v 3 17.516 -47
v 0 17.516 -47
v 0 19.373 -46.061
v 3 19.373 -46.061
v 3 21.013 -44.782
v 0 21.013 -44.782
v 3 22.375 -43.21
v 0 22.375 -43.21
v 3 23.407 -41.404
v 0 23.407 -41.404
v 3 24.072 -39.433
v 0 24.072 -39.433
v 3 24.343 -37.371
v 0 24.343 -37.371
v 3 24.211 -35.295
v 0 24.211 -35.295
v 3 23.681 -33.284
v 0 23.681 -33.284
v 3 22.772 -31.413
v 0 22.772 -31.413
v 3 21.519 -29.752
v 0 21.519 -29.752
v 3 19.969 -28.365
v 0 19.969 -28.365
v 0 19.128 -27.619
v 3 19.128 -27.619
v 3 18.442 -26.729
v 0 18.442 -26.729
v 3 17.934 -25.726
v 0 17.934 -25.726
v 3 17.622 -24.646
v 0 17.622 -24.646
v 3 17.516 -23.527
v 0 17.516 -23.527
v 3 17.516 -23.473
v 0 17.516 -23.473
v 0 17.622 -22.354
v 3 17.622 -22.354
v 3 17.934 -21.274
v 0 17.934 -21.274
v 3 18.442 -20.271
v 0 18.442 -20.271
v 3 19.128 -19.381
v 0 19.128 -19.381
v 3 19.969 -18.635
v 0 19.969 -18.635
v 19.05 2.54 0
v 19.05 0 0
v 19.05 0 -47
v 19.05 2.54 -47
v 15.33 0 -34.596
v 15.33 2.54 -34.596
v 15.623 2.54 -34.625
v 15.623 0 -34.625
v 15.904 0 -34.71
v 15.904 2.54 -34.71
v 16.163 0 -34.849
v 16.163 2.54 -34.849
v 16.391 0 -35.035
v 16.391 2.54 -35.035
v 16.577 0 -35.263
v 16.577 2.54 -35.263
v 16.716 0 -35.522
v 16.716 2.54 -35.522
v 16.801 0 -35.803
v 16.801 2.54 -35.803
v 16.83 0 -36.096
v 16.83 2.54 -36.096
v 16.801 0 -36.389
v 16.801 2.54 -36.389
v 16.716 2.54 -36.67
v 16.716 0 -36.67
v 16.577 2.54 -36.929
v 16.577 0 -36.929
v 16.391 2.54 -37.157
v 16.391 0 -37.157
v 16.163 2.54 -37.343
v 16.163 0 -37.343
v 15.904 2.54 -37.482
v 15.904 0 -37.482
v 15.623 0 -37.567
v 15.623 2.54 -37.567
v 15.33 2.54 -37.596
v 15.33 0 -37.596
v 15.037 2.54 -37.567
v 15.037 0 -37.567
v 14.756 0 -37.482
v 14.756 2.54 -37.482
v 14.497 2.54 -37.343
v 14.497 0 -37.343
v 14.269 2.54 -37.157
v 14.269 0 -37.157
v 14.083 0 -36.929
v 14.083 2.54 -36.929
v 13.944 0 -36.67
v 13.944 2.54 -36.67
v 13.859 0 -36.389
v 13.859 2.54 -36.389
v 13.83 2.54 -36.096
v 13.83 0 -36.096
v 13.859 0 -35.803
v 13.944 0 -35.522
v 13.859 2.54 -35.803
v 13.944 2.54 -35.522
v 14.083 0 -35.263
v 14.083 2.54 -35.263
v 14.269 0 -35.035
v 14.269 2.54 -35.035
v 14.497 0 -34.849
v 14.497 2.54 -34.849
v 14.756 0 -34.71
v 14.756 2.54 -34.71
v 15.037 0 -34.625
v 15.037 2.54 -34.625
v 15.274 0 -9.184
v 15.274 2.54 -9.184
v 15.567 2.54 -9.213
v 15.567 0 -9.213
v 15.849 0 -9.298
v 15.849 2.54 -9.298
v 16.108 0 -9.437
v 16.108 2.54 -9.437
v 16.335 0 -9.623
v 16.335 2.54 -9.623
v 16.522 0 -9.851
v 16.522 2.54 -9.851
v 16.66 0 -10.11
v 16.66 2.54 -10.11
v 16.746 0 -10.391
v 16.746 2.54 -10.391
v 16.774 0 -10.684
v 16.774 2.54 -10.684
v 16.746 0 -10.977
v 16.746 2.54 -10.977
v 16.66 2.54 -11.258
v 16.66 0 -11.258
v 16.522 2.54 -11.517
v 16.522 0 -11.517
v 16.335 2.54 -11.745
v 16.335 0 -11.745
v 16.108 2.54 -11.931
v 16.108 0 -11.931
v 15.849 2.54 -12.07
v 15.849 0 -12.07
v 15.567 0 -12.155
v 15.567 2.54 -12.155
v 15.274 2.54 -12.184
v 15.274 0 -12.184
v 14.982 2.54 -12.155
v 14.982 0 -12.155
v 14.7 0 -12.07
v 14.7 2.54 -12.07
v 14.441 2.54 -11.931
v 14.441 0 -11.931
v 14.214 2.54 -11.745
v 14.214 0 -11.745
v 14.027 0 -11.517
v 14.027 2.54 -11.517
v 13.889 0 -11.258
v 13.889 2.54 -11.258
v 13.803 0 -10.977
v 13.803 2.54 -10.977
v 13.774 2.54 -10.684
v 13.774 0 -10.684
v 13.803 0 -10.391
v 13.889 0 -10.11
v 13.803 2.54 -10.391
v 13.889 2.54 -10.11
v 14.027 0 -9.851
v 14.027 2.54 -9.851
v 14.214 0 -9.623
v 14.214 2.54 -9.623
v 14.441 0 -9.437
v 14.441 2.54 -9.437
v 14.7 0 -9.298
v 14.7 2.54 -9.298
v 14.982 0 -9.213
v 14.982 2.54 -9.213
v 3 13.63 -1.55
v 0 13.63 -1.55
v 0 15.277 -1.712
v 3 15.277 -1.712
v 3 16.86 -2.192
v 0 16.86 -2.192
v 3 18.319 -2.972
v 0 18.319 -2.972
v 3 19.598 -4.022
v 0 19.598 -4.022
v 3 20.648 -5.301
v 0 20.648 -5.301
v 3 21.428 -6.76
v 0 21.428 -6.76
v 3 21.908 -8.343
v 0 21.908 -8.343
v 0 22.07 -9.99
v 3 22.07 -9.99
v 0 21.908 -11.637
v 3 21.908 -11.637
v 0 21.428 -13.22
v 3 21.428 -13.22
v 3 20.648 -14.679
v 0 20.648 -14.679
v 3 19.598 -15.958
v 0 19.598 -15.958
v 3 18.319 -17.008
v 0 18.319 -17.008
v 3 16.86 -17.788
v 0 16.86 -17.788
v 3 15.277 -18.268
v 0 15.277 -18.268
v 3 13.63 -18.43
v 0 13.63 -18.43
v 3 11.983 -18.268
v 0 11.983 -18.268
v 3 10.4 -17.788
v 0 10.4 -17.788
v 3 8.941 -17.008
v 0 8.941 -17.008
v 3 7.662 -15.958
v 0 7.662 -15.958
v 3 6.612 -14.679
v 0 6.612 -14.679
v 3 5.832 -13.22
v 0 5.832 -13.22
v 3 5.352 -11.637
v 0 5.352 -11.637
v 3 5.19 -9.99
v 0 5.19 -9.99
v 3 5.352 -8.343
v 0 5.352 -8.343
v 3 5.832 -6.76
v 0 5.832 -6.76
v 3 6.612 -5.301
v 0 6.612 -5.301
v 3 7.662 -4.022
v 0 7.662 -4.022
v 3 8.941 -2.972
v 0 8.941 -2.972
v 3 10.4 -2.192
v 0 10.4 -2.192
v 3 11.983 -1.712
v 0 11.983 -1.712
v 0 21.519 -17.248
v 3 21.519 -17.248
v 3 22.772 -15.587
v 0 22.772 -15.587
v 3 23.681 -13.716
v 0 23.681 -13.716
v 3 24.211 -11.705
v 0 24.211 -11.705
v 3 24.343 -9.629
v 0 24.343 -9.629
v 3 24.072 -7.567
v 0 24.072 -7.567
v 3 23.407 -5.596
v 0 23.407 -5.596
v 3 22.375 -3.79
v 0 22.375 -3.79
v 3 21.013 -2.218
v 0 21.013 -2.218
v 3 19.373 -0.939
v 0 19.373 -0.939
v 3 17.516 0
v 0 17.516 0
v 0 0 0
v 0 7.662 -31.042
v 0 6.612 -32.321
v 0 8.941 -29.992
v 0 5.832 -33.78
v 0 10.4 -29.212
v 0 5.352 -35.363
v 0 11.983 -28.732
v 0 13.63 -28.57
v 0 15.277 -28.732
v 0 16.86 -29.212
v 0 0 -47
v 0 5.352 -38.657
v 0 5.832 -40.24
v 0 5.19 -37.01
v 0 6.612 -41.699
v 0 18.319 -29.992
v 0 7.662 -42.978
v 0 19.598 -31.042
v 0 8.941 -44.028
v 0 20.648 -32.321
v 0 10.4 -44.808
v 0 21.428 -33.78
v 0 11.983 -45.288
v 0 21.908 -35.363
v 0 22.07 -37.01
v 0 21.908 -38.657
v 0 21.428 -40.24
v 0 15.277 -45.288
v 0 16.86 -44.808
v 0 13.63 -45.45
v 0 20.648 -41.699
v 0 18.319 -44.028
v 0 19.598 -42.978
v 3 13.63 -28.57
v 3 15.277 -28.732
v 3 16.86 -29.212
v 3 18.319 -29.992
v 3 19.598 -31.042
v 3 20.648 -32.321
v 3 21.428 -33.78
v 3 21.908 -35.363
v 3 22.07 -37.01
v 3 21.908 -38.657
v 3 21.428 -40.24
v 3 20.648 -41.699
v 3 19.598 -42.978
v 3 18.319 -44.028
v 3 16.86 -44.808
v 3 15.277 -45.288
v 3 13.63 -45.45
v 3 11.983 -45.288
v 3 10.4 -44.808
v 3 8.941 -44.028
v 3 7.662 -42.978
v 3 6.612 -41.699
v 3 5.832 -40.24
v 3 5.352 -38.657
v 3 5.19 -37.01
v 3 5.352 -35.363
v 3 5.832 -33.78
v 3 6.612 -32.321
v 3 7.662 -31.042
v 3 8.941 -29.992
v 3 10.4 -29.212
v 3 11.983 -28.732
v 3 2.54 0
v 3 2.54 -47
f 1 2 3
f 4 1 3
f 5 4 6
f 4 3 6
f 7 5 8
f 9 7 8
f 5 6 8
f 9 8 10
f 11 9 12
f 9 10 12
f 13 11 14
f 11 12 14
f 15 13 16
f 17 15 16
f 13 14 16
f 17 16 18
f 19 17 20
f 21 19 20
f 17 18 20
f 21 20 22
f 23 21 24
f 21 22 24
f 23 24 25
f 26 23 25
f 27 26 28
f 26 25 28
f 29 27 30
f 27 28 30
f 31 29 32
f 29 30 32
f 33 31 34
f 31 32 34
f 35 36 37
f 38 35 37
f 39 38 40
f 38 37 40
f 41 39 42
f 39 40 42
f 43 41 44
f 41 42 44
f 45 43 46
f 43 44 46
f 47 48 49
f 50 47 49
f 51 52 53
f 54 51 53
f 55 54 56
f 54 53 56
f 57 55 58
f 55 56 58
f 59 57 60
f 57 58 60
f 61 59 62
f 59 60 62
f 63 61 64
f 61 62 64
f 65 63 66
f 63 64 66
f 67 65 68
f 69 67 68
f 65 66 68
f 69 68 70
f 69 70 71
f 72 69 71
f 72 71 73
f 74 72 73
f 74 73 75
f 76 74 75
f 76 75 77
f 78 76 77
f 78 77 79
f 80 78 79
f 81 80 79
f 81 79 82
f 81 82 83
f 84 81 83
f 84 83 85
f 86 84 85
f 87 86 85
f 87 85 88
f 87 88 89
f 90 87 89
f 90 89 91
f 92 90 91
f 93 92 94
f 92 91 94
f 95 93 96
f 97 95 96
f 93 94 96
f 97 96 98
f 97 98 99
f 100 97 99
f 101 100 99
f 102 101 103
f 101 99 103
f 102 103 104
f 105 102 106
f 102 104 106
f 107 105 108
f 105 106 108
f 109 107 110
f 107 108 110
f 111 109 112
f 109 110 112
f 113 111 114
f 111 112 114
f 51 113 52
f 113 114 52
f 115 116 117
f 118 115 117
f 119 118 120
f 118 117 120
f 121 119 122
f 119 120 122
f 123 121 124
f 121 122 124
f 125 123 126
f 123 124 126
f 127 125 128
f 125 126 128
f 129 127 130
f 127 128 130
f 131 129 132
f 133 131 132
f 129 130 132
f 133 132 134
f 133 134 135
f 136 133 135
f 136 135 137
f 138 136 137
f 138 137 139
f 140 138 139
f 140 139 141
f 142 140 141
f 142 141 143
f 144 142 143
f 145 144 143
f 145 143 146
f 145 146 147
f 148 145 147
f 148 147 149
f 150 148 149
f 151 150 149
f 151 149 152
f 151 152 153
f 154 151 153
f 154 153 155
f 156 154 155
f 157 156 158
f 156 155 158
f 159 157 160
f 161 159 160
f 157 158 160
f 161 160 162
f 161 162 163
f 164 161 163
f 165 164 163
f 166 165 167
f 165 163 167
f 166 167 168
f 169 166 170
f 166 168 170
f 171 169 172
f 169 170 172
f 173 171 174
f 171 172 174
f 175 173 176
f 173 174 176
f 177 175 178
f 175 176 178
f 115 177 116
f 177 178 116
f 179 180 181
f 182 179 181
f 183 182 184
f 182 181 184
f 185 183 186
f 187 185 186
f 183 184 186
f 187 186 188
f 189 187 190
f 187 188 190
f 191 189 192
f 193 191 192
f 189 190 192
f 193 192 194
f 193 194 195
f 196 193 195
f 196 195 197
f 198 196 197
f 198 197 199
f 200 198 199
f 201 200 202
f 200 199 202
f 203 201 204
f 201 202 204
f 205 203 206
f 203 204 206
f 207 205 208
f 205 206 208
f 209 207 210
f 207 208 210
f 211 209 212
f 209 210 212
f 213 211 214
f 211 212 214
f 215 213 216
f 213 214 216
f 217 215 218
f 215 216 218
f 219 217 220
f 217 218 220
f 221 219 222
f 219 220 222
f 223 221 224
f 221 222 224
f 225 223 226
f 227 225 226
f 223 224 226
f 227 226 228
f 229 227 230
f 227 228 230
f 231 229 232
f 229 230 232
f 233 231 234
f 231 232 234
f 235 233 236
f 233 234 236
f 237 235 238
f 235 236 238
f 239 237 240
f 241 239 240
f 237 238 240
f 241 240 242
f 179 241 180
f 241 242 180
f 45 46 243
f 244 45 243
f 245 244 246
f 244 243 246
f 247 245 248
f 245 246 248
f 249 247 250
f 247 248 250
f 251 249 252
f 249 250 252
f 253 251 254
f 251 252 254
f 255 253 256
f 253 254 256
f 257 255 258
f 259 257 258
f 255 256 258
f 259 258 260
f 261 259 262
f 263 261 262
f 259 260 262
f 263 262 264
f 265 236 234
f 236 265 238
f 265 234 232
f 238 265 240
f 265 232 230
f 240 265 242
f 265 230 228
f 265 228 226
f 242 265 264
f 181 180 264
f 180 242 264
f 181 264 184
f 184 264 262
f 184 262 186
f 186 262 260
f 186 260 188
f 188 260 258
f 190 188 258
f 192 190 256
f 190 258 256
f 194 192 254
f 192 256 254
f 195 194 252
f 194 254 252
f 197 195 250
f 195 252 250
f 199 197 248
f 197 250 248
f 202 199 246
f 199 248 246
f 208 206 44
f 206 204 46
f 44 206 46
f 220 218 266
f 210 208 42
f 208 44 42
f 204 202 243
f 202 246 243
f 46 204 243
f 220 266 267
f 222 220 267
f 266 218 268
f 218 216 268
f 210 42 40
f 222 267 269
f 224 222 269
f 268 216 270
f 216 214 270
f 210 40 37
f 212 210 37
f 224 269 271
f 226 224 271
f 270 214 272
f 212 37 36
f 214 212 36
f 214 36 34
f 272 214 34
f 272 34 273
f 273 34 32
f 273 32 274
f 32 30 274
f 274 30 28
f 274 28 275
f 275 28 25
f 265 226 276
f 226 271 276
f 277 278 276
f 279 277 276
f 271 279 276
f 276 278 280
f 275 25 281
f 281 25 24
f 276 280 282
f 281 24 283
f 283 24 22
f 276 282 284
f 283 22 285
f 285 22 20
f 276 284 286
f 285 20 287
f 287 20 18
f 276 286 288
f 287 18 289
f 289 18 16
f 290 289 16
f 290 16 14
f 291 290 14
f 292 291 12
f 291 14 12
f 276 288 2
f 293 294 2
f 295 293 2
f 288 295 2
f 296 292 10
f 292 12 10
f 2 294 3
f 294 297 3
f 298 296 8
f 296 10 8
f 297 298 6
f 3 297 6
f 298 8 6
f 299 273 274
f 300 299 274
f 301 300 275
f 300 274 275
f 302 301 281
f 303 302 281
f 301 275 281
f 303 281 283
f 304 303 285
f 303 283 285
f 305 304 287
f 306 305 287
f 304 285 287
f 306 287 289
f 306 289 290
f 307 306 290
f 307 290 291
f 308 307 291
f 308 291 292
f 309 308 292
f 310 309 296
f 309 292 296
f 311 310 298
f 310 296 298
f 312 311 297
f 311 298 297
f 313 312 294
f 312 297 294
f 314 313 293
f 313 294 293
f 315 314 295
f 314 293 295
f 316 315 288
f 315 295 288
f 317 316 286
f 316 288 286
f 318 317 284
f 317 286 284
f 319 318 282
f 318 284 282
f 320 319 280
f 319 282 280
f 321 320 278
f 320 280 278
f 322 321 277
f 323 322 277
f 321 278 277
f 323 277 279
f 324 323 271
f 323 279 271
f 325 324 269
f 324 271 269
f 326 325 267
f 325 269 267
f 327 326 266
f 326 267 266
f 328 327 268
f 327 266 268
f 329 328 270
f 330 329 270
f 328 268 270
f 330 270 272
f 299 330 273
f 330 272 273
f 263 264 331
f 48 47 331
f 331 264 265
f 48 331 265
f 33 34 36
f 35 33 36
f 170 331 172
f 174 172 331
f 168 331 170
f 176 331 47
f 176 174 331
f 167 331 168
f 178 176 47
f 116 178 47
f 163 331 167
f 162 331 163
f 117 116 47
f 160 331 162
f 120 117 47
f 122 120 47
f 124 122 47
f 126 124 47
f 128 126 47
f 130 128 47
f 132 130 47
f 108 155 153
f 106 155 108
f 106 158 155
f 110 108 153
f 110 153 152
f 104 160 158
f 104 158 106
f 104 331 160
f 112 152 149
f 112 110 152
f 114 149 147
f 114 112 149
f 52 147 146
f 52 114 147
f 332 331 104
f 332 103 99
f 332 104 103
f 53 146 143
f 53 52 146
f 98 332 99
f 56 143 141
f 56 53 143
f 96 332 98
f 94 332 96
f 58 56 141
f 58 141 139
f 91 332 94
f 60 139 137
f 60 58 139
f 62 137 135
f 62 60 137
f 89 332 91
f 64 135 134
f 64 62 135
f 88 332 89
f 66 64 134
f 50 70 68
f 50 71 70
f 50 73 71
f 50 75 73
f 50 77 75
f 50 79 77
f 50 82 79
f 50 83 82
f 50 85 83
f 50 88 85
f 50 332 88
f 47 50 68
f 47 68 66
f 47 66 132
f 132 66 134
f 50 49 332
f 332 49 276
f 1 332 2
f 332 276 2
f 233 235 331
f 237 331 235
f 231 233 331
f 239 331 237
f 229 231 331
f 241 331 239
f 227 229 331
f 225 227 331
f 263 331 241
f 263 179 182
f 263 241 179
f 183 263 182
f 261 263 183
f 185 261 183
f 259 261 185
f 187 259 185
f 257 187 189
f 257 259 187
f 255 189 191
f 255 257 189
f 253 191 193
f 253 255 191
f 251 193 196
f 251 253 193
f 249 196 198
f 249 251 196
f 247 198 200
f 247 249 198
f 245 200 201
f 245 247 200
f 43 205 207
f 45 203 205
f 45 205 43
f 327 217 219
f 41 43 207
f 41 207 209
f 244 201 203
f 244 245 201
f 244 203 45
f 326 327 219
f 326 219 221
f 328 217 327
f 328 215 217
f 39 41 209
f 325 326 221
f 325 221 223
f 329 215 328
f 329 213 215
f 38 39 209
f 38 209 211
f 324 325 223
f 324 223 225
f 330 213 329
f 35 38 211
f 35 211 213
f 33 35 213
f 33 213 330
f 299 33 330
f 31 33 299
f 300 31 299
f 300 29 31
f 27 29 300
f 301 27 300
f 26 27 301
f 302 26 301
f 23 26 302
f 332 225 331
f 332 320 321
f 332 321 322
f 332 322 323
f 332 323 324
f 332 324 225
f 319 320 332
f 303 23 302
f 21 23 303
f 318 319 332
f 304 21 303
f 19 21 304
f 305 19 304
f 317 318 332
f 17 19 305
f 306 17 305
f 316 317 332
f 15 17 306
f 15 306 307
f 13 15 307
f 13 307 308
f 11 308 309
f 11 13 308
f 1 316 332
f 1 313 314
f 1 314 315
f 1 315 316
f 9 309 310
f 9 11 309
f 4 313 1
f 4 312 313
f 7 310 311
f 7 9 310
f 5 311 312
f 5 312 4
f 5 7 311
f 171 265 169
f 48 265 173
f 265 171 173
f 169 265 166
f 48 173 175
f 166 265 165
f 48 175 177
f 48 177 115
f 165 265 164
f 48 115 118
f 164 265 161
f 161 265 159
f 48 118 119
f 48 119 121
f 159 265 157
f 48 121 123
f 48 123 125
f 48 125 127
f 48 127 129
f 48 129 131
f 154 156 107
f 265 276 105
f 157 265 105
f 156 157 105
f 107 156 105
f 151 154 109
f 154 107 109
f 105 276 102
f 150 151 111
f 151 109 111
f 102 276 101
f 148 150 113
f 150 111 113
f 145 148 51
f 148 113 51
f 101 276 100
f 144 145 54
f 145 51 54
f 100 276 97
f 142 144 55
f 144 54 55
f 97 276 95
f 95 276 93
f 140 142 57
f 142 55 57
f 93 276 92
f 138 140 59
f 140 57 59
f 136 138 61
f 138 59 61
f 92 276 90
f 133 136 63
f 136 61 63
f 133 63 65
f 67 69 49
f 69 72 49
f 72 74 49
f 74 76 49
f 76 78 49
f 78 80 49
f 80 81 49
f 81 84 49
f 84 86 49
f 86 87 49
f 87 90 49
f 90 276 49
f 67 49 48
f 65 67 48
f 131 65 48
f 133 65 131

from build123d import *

# Parameters (mm, degrees)
SKETCH1_W           = 19.05
SKETCH1_H           = 47
BOSS_EXTRUDE1_DEPTH = 2.54
SKETCH2_R           = 8.44
BOSS_EXTRUDE2_DEPTH = 3
SKETCH3_R           = 1.5
CUT_EXTRUDE1_DEPTH  = 56.204627156


with BuildPart() as part:
    # Sketch1 → Boss-Extrude1 (new body)
    with BuildSketch(Plane(origin=(0, 0, 0), x_dir=(1, 0, 0), z_dir=(0, 1, 0))):
        with Locations((9.525, 23.5)):
            Rectangle(SKETCH1_W, SKETCH1_H)
    extrude(amount=BOSS_EXTRUDE1_DEPTH)

    # Sketch2 → Boss-Extrude2 (add)
    with BuildSketch(Plane.ZY):
        with BuildLine():
            Line((-23.526869674, 17.516472082), (-23.473130326, 17.516472082))
            ThreePointArc((-23.473130326, 17.516472082), (-20.760886981, 18.164487773), (-18.634502385, 19.968560069))
            ThreePointArc((-18.634502385, 19.968560069), (-8.591509803, 24.257746253), (0, 17.516472082))
            Line((0, 17.516472082), (0, 2.54))
            Line((0, 2.54), (-47, 2.54))
            Line((-47, 2.54), (-47, 17.516472082))
            ThreePointArc((-47, 17.516472082), (-38.408490197, 24.257746253), (-28.365497615, 19.968560069))
            ThreePointArc((-28.365497615, 19.968560069), (-26.239113019, 18.164487773), (-23.526869674, 17.516472082))
        make_face()
        with Locations((-9.99, 13.63)):
            Circle(SKETCH2_R, mode=Mode.SUBTRACT)
        with Locations((-37.01, 13.63)):
            Circle(SKETCH2_R, mode=Mode.SUBTRACT)
    extrude(amount=-BOSS_EXTRUDE2_DEPTH)

    # Sketch3 → Cut-Extrude1 (cut, through all)
    with BuildSketch(Plane(origin=(0, 2.54, 0), x_dir=(1, 0, 0), z_dir=(0, 1, 0))):
        with Locations(Location((15.274497475, 10.68388452, 0), (0, 0, 270))):
            Circle(SKETCH3_R)
        with Locations(Location((15.33, 36.095973984, 0), (0, 0, 270))):
            Circle(SKETCH3_R)
    extrude(amount=-CUT_EXTRUDE1_DEPTH, mode=Mode.SUBTRACT)


solid = part.part
